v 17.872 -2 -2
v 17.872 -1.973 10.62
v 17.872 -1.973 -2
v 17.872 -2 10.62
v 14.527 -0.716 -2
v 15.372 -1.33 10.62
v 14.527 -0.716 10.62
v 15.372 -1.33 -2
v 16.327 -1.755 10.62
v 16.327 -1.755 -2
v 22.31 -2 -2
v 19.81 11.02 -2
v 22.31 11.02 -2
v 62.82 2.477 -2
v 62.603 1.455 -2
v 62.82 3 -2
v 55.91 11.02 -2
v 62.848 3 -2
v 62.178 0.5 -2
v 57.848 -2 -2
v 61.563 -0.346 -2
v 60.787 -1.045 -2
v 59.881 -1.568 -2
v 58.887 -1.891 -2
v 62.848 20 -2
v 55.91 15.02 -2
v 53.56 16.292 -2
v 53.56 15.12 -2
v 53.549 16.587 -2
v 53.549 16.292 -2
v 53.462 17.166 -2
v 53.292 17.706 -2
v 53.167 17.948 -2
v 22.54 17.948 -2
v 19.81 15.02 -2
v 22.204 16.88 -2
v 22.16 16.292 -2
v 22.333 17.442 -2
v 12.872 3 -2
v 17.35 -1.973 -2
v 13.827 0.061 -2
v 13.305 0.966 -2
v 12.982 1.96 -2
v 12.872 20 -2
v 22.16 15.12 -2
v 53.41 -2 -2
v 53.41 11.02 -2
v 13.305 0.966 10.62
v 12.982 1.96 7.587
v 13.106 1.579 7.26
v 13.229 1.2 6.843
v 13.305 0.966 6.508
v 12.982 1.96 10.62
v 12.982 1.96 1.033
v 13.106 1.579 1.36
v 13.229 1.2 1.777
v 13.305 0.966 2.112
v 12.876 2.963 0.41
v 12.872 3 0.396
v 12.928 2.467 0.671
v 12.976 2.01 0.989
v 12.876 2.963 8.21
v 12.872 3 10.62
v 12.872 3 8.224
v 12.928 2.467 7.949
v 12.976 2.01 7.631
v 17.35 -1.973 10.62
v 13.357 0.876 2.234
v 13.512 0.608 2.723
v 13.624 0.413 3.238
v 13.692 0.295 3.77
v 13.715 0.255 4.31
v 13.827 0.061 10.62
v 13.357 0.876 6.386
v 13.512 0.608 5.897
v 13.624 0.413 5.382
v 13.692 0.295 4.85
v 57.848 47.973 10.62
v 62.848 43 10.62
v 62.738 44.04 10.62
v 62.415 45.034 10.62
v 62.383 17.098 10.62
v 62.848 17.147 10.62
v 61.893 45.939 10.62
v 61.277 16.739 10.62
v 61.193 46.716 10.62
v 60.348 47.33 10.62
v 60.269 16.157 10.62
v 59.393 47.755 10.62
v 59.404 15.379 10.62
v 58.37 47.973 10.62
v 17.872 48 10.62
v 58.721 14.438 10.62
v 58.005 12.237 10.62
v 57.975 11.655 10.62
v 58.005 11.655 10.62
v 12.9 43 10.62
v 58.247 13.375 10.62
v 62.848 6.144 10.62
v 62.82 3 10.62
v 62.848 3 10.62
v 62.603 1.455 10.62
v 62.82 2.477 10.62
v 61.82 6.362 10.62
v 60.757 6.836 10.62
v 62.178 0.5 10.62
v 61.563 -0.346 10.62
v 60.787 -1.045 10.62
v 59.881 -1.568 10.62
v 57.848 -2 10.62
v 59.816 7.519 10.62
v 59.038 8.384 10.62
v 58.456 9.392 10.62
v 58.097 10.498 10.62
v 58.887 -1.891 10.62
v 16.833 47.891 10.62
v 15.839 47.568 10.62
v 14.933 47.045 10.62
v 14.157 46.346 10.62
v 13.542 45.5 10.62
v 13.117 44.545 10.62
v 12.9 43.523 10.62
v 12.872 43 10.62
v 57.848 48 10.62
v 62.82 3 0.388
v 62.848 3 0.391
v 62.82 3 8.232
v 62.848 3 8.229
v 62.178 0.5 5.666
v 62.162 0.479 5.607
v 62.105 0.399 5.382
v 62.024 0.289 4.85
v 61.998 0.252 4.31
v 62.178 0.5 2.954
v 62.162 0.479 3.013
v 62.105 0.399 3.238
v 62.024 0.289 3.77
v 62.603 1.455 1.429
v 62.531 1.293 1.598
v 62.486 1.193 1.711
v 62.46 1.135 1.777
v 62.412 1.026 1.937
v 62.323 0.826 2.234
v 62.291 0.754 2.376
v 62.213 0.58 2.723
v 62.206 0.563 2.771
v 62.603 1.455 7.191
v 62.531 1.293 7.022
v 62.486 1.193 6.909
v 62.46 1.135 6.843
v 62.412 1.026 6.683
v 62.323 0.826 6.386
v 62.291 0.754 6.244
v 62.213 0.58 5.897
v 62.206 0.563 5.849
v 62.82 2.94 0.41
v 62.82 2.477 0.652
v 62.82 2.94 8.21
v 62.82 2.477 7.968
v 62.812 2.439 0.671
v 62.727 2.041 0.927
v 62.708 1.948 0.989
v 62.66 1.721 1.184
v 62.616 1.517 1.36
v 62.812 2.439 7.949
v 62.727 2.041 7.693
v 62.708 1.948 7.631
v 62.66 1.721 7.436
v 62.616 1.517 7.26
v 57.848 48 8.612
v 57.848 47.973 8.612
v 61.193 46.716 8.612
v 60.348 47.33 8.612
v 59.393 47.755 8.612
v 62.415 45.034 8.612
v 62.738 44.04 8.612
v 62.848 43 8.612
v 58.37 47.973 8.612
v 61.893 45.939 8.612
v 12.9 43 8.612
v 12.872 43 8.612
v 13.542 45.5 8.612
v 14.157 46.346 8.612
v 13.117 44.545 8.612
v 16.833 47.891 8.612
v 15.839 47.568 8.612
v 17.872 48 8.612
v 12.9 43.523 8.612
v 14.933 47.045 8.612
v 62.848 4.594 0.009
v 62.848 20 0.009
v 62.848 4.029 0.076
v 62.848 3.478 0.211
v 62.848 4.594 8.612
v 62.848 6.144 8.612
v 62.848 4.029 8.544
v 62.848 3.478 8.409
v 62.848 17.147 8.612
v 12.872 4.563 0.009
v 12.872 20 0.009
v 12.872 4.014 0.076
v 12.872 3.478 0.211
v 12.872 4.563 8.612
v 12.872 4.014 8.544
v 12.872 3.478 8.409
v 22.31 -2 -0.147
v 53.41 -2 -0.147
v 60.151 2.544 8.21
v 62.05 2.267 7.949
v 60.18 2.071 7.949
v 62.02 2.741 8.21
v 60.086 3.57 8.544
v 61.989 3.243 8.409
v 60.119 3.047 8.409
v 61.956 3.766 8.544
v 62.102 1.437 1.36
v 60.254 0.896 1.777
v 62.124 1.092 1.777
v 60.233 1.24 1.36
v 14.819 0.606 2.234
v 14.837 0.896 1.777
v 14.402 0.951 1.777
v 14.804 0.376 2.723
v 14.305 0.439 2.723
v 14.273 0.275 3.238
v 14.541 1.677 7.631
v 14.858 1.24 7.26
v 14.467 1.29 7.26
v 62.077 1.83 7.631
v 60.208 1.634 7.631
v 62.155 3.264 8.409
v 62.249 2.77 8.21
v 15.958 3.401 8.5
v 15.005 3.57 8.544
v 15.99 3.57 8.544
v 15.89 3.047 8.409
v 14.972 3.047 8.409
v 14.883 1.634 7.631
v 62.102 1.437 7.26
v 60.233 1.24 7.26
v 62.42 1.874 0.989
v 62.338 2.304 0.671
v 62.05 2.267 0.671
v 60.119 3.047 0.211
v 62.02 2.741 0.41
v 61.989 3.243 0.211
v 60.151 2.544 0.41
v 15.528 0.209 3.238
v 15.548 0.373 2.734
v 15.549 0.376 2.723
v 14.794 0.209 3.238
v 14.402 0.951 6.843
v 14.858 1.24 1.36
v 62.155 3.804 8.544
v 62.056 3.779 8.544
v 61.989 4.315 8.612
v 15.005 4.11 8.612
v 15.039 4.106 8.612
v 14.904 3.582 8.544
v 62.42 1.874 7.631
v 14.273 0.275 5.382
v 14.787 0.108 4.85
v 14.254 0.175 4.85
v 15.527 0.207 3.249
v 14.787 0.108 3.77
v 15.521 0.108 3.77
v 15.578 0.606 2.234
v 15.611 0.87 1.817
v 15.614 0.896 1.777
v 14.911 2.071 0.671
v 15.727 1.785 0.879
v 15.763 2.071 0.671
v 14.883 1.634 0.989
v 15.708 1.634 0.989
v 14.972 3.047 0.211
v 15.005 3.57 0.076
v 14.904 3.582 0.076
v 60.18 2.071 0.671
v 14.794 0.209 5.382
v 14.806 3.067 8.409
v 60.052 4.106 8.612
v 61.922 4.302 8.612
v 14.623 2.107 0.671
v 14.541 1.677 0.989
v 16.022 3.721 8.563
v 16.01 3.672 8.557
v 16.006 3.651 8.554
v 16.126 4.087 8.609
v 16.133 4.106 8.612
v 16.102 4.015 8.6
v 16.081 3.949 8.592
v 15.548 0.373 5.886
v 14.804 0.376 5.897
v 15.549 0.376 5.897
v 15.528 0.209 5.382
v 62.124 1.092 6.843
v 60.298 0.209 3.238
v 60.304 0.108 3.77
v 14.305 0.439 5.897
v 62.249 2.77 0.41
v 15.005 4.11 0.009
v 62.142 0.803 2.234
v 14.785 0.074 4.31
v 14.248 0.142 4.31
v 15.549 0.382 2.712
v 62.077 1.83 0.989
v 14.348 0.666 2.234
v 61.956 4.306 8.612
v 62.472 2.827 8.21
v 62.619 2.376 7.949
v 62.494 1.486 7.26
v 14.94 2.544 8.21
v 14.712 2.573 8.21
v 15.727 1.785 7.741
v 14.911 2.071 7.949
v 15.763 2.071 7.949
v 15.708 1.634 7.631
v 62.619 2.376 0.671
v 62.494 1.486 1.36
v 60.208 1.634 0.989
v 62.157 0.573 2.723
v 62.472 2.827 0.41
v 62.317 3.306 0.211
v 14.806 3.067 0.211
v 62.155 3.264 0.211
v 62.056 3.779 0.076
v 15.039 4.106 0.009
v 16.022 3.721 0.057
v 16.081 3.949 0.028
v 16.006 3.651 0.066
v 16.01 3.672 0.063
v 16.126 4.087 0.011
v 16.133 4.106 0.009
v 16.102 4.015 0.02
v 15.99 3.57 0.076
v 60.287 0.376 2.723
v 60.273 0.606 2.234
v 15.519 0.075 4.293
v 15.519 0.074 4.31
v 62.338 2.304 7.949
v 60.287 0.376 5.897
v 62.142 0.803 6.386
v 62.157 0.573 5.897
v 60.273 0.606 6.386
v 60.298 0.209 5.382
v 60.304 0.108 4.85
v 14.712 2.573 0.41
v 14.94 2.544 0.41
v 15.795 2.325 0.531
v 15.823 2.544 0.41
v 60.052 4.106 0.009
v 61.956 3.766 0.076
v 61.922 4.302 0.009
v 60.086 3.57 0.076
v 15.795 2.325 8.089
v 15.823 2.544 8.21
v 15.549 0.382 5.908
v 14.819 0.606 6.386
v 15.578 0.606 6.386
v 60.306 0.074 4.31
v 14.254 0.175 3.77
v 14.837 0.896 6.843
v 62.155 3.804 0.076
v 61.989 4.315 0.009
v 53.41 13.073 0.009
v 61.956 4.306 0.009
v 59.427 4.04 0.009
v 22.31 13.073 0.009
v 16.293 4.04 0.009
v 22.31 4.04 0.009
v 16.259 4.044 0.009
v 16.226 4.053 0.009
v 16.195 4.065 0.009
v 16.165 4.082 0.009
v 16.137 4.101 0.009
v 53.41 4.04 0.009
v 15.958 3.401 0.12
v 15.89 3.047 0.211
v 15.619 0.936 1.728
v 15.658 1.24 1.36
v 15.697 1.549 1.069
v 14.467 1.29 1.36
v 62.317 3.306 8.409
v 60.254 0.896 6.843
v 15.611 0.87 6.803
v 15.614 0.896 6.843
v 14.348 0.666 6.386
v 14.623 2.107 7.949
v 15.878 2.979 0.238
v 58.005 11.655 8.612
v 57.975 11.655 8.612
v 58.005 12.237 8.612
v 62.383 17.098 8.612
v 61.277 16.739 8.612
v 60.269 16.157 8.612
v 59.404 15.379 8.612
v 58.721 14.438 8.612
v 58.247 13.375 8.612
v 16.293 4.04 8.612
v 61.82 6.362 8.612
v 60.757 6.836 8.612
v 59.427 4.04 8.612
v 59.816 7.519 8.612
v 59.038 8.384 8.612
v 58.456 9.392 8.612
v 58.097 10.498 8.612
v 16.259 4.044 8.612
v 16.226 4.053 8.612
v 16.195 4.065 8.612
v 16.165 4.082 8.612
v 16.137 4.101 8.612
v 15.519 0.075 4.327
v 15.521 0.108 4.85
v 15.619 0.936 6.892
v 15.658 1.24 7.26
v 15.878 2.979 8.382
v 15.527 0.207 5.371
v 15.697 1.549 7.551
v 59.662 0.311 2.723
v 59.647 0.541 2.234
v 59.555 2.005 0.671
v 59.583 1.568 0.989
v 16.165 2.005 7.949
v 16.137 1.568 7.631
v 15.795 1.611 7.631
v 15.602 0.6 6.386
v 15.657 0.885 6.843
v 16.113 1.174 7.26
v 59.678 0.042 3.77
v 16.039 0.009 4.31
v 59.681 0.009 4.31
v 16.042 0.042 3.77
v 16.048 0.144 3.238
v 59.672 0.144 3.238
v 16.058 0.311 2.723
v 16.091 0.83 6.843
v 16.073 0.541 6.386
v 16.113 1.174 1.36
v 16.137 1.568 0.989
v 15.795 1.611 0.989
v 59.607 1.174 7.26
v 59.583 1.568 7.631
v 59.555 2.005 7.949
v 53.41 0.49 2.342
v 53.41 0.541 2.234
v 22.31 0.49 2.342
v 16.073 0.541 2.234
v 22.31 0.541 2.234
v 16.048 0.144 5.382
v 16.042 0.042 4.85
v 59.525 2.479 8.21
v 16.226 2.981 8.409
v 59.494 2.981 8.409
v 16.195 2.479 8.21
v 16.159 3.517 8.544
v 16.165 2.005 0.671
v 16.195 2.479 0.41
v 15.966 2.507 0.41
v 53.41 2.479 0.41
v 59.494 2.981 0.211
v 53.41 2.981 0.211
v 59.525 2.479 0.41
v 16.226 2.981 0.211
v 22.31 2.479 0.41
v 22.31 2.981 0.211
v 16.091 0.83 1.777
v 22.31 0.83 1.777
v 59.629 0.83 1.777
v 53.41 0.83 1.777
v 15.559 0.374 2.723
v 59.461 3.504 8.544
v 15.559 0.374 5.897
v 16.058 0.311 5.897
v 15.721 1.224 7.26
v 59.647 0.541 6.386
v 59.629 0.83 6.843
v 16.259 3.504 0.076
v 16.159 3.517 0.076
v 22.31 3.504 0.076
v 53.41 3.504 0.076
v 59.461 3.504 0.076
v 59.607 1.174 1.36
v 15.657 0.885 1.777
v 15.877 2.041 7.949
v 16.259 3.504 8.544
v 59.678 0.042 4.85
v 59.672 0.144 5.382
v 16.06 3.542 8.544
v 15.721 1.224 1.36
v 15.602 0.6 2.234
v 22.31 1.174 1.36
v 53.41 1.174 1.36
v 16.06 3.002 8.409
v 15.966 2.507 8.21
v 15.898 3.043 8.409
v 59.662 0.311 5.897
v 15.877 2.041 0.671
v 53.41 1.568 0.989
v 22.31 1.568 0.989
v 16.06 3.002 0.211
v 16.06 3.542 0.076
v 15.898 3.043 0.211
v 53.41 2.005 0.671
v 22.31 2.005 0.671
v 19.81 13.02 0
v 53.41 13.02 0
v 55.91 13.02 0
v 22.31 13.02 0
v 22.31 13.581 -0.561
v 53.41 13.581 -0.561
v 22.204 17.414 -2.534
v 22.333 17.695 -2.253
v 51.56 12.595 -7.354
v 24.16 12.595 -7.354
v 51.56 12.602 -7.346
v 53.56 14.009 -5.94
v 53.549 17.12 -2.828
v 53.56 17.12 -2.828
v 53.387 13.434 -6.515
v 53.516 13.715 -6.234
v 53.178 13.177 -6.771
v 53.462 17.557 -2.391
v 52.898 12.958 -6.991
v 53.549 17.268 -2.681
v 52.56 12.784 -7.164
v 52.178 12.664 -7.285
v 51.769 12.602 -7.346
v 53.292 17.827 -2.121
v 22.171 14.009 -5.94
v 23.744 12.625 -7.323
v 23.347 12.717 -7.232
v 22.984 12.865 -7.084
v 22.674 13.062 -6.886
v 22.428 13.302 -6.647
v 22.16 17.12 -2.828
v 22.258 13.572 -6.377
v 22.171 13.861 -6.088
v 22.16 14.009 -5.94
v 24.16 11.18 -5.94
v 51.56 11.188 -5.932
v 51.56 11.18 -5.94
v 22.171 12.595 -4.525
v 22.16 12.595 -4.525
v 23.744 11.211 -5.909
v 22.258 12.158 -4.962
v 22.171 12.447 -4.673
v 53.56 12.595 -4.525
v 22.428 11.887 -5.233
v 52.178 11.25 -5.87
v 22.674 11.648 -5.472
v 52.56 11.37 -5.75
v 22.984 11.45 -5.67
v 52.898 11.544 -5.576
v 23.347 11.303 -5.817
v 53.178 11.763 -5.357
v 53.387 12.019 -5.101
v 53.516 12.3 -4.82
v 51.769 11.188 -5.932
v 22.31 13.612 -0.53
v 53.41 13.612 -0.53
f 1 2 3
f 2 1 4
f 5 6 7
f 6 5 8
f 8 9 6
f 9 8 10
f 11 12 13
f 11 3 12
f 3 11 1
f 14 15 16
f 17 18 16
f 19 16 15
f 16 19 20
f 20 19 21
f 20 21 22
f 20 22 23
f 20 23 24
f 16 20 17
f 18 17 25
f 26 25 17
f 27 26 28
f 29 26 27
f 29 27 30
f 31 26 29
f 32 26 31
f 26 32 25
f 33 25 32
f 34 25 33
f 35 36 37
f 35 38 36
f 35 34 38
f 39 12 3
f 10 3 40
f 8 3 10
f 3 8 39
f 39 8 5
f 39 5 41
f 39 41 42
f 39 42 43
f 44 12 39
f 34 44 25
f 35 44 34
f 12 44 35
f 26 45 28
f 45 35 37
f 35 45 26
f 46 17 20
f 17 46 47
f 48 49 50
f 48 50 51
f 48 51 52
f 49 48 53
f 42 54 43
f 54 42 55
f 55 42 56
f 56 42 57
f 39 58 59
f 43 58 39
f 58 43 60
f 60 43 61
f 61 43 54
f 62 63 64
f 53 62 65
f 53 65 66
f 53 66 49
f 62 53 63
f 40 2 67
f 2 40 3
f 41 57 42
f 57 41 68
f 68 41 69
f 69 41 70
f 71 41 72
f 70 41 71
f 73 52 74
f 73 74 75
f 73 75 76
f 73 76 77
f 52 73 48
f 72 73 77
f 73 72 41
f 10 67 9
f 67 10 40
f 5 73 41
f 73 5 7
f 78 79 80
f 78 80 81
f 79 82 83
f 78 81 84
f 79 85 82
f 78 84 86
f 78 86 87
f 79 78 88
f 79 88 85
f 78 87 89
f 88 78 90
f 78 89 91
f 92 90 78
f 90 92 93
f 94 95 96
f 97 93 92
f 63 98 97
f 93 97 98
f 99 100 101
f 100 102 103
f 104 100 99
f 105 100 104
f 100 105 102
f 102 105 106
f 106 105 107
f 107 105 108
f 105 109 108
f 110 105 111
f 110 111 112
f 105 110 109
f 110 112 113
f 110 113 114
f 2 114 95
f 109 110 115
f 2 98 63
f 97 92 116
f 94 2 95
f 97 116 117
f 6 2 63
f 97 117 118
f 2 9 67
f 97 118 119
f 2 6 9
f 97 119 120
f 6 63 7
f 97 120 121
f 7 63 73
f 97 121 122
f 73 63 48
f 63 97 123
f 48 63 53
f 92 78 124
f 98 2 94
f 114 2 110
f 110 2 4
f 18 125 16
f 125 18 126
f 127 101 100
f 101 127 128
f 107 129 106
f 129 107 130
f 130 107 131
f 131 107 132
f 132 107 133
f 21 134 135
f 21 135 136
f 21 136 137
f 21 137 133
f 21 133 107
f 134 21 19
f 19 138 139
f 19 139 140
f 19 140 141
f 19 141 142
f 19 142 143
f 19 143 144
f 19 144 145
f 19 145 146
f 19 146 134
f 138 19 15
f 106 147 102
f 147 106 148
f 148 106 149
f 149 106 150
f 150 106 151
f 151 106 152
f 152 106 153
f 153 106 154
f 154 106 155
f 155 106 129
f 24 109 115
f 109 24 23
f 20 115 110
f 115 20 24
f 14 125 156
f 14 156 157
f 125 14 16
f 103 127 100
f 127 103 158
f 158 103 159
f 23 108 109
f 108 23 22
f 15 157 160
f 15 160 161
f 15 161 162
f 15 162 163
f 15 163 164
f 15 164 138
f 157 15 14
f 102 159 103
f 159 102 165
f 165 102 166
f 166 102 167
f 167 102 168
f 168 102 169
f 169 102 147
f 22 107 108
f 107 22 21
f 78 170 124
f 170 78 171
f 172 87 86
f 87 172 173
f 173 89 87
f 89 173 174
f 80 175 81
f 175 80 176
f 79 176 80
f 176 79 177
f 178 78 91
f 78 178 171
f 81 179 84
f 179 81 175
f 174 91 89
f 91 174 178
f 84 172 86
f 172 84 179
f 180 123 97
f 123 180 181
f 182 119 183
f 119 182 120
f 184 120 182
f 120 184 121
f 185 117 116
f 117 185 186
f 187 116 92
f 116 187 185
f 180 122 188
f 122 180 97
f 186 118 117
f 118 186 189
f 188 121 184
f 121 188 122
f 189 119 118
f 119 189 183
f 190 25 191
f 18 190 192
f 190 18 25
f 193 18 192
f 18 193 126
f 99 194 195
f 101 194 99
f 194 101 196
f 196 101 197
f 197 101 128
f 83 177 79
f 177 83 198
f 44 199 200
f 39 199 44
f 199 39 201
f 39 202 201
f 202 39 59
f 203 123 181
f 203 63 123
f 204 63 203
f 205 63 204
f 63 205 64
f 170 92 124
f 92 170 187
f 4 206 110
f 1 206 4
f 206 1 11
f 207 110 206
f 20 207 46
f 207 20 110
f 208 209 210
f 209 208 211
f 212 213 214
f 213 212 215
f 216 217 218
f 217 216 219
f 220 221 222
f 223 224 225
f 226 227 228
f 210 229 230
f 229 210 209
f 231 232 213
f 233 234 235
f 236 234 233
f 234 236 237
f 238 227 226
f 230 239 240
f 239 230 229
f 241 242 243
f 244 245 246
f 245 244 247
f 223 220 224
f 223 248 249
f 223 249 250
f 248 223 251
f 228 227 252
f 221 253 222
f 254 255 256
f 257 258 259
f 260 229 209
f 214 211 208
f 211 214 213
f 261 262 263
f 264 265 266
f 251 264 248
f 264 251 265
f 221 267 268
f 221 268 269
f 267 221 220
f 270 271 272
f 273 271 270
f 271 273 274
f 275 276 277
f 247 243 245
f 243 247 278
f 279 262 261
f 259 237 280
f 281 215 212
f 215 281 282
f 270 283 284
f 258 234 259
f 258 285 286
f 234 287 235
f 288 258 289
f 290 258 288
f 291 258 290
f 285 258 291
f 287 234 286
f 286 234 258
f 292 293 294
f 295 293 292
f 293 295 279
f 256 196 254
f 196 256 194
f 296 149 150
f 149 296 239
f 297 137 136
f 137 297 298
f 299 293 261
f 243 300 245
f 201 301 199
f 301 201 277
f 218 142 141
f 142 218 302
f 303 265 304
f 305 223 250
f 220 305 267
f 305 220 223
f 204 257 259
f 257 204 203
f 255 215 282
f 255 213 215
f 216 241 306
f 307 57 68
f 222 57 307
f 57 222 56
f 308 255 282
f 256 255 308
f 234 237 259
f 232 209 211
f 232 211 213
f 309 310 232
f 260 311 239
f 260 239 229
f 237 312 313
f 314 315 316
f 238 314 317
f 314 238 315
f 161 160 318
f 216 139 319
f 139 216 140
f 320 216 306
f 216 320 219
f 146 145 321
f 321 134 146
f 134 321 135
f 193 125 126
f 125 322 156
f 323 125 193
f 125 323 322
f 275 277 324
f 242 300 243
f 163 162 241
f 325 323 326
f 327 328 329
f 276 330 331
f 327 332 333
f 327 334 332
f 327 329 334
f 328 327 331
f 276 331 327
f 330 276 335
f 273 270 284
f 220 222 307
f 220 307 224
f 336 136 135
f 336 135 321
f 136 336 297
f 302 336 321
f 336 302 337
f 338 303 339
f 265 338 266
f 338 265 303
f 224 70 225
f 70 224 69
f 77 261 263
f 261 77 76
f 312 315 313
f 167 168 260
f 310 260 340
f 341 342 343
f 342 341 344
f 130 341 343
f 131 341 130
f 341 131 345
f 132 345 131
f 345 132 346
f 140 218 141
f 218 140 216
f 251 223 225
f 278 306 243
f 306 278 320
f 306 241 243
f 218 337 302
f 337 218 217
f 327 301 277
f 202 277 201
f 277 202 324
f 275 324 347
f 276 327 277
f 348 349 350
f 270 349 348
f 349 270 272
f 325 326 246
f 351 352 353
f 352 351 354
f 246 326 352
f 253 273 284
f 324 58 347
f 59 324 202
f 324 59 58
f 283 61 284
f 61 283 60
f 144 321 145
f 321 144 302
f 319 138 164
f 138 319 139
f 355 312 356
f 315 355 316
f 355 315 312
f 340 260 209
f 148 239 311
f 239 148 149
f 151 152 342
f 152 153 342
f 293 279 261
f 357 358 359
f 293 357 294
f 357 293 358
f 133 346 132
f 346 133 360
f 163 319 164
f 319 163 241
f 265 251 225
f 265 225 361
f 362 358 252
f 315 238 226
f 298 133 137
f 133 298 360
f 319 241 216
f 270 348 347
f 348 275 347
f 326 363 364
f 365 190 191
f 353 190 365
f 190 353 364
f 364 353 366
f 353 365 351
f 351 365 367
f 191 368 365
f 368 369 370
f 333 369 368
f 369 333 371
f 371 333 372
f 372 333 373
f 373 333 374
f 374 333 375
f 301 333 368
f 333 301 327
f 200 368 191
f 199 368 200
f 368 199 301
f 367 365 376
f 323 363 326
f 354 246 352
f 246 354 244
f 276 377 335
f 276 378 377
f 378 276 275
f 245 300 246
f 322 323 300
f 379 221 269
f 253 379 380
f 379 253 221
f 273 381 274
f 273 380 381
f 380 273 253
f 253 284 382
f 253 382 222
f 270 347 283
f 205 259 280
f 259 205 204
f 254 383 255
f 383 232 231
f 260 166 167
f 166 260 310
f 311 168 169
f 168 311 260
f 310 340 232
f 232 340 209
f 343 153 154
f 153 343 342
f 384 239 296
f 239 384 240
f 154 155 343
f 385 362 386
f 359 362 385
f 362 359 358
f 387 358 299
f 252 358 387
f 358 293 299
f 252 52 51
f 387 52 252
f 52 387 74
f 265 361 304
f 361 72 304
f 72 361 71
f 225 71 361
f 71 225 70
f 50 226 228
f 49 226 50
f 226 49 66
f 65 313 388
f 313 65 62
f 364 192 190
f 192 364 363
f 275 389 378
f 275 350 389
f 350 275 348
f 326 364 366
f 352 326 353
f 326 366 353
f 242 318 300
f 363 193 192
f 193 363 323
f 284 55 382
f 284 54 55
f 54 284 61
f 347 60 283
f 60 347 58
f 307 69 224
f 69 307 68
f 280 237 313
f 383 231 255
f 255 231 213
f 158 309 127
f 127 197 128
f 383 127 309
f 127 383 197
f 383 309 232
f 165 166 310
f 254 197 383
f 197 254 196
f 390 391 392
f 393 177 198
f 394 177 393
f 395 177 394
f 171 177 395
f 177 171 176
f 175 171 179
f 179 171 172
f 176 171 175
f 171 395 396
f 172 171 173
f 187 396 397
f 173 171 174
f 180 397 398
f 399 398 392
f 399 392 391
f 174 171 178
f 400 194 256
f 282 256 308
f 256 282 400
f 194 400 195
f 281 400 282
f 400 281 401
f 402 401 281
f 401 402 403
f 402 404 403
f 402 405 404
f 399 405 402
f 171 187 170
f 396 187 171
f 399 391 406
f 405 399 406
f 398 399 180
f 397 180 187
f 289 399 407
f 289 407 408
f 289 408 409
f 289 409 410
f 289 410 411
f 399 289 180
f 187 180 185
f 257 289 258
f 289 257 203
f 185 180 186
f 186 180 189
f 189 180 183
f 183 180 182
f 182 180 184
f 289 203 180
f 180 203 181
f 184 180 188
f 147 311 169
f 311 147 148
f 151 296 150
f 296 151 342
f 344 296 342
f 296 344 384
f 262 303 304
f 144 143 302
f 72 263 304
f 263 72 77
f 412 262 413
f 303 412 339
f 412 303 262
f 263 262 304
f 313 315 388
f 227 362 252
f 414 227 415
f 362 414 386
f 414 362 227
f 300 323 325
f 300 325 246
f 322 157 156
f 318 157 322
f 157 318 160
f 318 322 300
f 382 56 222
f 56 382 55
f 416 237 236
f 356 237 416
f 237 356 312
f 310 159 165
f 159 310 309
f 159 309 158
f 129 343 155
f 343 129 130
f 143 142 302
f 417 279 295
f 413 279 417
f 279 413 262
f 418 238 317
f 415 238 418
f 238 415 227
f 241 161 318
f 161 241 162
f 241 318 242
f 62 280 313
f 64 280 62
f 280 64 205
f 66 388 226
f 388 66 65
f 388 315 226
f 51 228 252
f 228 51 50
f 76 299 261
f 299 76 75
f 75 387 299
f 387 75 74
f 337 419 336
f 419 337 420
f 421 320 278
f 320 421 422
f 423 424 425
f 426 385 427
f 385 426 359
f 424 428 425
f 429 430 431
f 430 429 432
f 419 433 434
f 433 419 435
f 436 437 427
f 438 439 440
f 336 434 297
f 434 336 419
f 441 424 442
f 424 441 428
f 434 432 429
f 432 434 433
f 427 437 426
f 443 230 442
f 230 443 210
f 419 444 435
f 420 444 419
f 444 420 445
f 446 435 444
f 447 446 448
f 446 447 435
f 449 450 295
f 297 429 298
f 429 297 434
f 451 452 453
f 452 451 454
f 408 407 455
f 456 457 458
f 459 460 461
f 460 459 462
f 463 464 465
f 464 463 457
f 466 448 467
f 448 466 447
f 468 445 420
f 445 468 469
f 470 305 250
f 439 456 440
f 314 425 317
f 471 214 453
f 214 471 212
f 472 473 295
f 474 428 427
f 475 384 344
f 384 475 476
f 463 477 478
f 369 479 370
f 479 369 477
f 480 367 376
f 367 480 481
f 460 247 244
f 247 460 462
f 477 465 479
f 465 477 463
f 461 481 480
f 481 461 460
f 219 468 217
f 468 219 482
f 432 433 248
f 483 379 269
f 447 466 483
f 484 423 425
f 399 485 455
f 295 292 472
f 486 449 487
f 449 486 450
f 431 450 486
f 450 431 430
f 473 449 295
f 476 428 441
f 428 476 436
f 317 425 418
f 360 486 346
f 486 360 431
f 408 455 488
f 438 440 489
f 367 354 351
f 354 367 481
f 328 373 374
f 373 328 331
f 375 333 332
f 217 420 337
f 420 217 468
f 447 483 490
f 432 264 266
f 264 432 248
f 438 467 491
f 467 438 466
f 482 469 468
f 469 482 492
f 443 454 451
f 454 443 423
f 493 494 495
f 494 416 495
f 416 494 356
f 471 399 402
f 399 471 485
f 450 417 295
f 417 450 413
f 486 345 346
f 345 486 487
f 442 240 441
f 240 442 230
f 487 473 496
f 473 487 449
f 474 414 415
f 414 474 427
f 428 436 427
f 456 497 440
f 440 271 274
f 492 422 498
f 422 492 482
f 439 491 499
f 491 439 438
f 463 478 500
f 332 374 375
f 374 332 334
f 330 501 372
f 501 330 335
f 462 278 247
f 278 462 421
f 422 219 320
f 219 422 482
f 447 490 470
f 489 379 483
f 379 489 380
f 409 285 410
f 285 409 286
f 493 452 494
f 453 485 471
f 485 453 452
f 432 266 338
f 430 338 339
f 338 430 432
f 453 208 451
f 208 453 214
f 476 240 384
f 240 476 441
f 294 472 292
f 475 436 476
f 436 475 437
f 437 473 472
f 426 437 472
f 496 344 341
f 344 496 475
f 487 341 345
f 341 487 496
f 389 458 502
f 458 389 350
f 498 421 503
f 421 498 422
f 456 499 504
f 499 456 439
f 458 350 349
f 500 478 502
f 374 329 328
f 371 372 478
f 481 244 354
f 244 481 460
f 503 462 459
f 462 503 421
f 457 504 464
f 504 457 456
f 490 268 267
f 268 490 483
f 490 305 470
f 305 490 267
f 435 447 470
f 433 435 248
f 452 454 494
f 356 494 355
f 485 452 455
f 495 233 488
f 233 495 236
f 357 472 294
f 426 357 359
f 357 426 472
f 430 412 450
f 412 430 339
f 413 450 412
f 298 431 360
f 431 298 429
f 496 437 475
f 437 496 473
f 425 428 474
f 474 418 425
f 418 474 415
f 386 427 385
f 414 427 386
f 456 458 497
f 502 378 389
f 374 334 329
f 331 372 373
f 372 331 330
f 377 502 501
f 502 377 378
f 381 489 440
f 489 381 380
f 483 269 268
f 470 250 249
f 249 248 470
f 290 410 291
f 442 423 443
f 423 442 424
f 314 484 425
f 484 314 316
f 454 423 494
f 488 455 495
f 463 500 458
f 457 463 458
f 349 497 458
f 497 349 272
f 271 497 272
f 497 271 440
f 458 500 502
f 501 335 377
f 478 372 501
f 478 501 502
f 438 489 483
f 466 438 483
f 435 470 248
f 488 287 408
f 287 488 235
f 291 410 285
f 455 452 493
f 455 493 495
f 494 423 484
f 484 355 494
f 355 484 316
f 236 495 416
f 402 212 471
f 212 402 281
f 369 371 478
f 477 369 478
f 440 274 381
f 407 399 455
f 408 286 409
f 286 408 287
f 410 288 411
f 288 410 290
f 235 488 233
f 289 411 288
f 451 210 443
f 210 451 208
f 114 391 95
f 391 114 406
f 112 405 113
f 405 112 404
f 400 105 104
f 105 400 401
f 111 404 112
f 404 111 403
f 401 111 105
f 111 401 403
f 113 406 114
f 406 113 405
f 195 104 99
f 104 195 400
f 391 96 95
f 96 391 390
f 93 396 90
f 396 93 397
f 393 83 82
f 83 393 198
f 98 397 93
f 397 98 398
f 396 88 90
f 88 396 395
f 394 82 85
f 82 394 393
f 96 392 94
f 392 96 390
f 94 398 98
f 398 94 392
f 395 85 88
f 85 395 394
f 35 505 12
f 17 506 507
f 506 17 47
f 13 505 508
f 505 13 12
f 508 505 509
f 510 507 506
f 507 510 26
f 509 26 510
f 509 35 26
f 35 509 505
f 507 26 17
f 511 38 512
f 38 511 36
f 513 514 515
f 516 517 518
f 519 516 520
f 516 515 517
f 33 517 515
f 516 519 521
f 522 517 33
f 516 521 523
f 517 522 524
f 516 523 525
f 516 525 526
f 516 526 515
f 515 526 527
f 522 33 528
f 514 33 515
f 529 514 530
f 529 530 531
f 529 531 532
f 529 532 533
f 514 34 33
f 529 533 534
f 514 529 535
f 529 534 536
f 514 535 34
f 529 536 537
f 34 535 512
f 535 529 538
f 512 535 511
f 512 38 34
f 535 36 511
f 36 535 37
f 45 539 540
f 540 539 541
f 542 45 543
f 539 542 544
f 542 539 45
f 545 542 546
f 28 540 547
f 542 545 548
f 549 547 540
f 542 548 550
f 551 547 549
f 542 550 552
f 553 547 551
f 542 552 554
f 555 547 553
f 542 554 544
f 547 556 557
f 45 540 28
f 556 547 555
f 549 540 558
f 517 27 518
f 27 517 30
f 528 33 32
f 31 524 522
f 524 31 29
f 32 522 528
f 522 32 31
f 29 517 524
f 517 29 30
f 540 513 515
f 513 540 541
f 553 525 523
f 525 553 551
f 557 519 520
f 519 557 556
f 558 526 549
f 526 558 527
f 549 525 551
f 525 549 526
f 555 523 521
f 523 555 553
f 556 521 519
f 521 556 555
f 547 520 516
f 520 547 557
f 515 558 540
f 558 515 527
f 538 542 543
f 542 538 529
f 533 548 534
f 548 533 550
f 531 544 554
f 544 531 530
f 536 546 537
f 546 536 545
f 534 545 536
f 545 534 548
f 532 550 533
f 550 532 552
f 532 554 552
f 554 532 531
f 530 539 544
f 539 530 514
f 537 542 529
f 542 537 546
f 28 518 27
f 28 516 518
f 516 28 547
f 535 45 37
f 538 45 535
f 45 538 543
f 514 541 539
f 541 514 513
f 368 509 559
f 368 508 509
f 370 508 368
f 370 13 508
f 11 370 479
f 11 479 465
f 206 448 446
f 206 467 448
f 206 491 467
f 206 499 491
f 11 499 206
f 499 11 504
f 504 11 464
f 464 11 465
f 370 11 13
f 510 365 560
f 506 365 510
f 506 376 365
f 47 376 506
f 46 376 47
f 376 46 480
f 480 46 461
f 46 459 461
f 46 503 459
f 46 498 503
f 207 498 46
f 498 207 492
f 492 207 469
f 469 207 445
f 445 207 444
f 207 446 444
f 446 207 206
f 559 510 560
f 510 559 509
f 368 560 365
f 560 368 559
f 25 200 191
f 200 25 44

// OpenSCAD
// Set to 0.01 for higher definition curves (renders slower)
$fs = 0.1;

module roundedsquare(xx, yy, radius) {

difference(){

    square([xx,yy]);

    difference(){
        translate([-.5,-.5,-.2])
        square([radius+.5,radius+.5]);

        translate([radius,radius,height/2])
        cylinder(height,radius,radius,true);
    }
    translate([xx,0,0])
    rotate(90)
    difference(){
        translate([-.5,-.5,-.2])
        square([radius+.5,radius+.5]);

        translate([radius,radius,height/2])
        cylinder(height,radius,radius,true);
    }

    translate([xx,yy,0])
    rotate(180)
    difference(){
        translate([-.5,-.5,-.2])
        square([radius+.5,radius+.5]);

        translate([radius,radius,height/2])
        cylinder(height,radius,radius,true);
    }

    translate([0,yy,0])
    rotate(270)
    difference(){
        translate([-.5,-.5,-.2])
        square([radius+.5,radius+.5]);

        translate([radius,radius,height/2])
        cylinder(height,radius,radius,true);
    }
}
}

module roundedcube2(xx, yy, height, radius) {

difference(){

    cube([xx,yy,height]);

    difference(){
        translate([-.5,-.5,-.2])
        cube([radius+.5,radius+.5,height+.5]);

        translate([radius,radius,height/2])
        cylinder(height,radius,radius,true);
    }
    translate([xx,0,0])
    rotate(90)
    difference(){
        translate([-.5,-.5,-.2])
        cube([radius+.5,radius+.5,height+.5]);

        translate([radius,radius,height/2])
        cylinder(height,radius,radius,true);
    }

    translate([xx,yy,0])
    rotate(180)
    difference(){
        translate([-.5,-.5,-.2])
        cube([radius+.5,radius+.5,height+.5]);

        translate([radius,radius,height/2])
        cylinder(height,radius,radius,true);
    }

    translate([0,yy,0])
    rotate(270)
    difference(){
        translate([-.5,-.5,-.2])
        cube([radius+.5,radius+.5,height+.5]);

        translate([radius,radius,height/2])
        cylinder(height,radius,radius,true);
    }
}
}


module phone(phone_width, phone_length, phone_thickness, phone_edge_radius, camera_bump_x_offset, camera_bump_y_offset, camera_bump_width, camera_bump_length, camera_bump_thickness, camera_bump_radius) {
    sphere_size = (phone_thickness/2);
    
    //color("red") roundedcube2(phone_width, phone_length, phone_thickness, phone_edge_radius);
    //minowski adds spheres around parts, so we need to translate by sphere_size
    translate([sphere_size, sphere_size, sphere_size]) {
        minkowski() {
           //minowski adds spheres around parts, so we need remove sphere size from width, length, and thickness
           roundedcube2(phone_width-sphere_size*2, phone_length-sphere_size*2, 0.00001, phone_edge_radius);
           sphere(r=sphere_size,$fn=50);
         }
     }

    translate([phone_width-camera_bump_x_offset-camera_bump_width/2, camera_bump_y_offset/2, phone_thickness-0.1]) {
        roundedcube2(camera_bump_width, camera_bump_length, camera_bump_thickness+0.1, camera_bump_radius);
    }
}

module mirror(size = [1,1,1], angle = 225) {
    rotate(a=angle, v=[1,0,0]){
        cube(size);
    }
}

module mirror_round(l,w,h, angle = 225, radius = 5) {
    rotate(a=angle, v=[1,0,0]){
        roundedcube2(l,w,h,radius);
    }
}


// all units in mm and degress

//offsets
phone_thickness_offset = 0.3;
camera_bump_offset = 0.1;

// iPhone XR dimensions
phone_width = 75.72; //from spec
phone_length = 150.91; //from spec
phone_thickness = 8.32+phone_thickness_offset; //from spec
phone_edge_radius = 12; // guess
camera_bump_x_offset = 12.28-camera_bump_offset; //from spec with offset
camera_bump_y_offset = 12.28-camera_bump_offset; //from spec with offset
camera_bump_width = 10.93+camera_bump_offset*2; //from spec with offset
camera_bump_length = 10.93+camera_bump_offset*2; //from spec with offset
camera_bump_thickness = 1.56+1;  //spec 1.56
camera_bump_radius = camera_bump_length/2; //Xr specific, make it round

// DFM experimental offsets
dfm_mirror_width= 0.7;
dfm_mirror_thickness=0.15;
dfm_notch_offset=2.3;

// mirror
mirror_height = 25.4; //from spec
mirror_width = 35.4 + dfm_mirror_width; //from spec -- 36.1 in file?
mirror_thickness = 3 + dfm_mirror_thickness; //from spec -- 

// mirror back
mirror_back_height = 8.4; 
mirror_back_width = 35.4-4; 
mirror_back_thickness = 2; 

// clip
clip_width = phone_width*0.66;
clip_length = 50;
clip_top_bottom_thickness = 2;
clip_thickness = phone_thickness+(clip_top_bottom_thickness*2); 

// clip cutout
cutout_width = mirror_width-5;
cutout_length = 16;
cutout_thickness = clip_thickness/2+5; //2 is just for some clearance

notch_offset_height = 5.57+5.15+dfm_notch_offset; //notch height from spec, add more?
notch_offset_width = phone_width/2-mirror_width/2;
back_offset_width = phone_width/2-mirror_back_width/2;

// trim up top length
difference() {
    //cutout from slot
    difference() {
        //clip with back
        union() {
         //resulting clip
         difference() {
            //clip cube
             translate([phone_width/2-clip_width/2, -clip_top_bottom_thickness, -clip_top_bottom_thickness]) color("red") roundedcube2(clip_width, clip_length, clip_thickness, 5);
             //phone and mirror back
             union() {
                //phone
                phone(phone_width, phone_length, phone_thickness, phone_edge_radius, camera_bump_x_offset, camera_bump_y_offset, camera_bump_width, camera_bump_length, camera_bump_thickness, camera_bump_radius);

                //mirror slot
                translate([notch_offset_width,notch_offset_height,0]) {
                    mirror([mirror_width, mirror_height, mirror_thickness]);
                }  
             }
         }
         
         //mirror back 4.1 is a magic number :/
         translate([back_offset_width, notch_offset_height+4.1, 0]) {
            color("blue") mirror_round(mirror_back_width, mirror_back_height, mirror_back_thickness, 225, 2);
        }
    }
    // cutout - with some magic numbers
    rotate(45, [1,0,0]) translate([phone_width/2-cutout_width/2,-clip_top_bottom_thickness-4.75,-      clip_top_bottom_thickness-8]) color("green") cube([cutout_width,cutout_length,cutout_thickness]);
    }
    // front trim cube
    translate([-10,20,-phone_thickness]) cube([phone_width+20,phone_length+20,10]);
}
